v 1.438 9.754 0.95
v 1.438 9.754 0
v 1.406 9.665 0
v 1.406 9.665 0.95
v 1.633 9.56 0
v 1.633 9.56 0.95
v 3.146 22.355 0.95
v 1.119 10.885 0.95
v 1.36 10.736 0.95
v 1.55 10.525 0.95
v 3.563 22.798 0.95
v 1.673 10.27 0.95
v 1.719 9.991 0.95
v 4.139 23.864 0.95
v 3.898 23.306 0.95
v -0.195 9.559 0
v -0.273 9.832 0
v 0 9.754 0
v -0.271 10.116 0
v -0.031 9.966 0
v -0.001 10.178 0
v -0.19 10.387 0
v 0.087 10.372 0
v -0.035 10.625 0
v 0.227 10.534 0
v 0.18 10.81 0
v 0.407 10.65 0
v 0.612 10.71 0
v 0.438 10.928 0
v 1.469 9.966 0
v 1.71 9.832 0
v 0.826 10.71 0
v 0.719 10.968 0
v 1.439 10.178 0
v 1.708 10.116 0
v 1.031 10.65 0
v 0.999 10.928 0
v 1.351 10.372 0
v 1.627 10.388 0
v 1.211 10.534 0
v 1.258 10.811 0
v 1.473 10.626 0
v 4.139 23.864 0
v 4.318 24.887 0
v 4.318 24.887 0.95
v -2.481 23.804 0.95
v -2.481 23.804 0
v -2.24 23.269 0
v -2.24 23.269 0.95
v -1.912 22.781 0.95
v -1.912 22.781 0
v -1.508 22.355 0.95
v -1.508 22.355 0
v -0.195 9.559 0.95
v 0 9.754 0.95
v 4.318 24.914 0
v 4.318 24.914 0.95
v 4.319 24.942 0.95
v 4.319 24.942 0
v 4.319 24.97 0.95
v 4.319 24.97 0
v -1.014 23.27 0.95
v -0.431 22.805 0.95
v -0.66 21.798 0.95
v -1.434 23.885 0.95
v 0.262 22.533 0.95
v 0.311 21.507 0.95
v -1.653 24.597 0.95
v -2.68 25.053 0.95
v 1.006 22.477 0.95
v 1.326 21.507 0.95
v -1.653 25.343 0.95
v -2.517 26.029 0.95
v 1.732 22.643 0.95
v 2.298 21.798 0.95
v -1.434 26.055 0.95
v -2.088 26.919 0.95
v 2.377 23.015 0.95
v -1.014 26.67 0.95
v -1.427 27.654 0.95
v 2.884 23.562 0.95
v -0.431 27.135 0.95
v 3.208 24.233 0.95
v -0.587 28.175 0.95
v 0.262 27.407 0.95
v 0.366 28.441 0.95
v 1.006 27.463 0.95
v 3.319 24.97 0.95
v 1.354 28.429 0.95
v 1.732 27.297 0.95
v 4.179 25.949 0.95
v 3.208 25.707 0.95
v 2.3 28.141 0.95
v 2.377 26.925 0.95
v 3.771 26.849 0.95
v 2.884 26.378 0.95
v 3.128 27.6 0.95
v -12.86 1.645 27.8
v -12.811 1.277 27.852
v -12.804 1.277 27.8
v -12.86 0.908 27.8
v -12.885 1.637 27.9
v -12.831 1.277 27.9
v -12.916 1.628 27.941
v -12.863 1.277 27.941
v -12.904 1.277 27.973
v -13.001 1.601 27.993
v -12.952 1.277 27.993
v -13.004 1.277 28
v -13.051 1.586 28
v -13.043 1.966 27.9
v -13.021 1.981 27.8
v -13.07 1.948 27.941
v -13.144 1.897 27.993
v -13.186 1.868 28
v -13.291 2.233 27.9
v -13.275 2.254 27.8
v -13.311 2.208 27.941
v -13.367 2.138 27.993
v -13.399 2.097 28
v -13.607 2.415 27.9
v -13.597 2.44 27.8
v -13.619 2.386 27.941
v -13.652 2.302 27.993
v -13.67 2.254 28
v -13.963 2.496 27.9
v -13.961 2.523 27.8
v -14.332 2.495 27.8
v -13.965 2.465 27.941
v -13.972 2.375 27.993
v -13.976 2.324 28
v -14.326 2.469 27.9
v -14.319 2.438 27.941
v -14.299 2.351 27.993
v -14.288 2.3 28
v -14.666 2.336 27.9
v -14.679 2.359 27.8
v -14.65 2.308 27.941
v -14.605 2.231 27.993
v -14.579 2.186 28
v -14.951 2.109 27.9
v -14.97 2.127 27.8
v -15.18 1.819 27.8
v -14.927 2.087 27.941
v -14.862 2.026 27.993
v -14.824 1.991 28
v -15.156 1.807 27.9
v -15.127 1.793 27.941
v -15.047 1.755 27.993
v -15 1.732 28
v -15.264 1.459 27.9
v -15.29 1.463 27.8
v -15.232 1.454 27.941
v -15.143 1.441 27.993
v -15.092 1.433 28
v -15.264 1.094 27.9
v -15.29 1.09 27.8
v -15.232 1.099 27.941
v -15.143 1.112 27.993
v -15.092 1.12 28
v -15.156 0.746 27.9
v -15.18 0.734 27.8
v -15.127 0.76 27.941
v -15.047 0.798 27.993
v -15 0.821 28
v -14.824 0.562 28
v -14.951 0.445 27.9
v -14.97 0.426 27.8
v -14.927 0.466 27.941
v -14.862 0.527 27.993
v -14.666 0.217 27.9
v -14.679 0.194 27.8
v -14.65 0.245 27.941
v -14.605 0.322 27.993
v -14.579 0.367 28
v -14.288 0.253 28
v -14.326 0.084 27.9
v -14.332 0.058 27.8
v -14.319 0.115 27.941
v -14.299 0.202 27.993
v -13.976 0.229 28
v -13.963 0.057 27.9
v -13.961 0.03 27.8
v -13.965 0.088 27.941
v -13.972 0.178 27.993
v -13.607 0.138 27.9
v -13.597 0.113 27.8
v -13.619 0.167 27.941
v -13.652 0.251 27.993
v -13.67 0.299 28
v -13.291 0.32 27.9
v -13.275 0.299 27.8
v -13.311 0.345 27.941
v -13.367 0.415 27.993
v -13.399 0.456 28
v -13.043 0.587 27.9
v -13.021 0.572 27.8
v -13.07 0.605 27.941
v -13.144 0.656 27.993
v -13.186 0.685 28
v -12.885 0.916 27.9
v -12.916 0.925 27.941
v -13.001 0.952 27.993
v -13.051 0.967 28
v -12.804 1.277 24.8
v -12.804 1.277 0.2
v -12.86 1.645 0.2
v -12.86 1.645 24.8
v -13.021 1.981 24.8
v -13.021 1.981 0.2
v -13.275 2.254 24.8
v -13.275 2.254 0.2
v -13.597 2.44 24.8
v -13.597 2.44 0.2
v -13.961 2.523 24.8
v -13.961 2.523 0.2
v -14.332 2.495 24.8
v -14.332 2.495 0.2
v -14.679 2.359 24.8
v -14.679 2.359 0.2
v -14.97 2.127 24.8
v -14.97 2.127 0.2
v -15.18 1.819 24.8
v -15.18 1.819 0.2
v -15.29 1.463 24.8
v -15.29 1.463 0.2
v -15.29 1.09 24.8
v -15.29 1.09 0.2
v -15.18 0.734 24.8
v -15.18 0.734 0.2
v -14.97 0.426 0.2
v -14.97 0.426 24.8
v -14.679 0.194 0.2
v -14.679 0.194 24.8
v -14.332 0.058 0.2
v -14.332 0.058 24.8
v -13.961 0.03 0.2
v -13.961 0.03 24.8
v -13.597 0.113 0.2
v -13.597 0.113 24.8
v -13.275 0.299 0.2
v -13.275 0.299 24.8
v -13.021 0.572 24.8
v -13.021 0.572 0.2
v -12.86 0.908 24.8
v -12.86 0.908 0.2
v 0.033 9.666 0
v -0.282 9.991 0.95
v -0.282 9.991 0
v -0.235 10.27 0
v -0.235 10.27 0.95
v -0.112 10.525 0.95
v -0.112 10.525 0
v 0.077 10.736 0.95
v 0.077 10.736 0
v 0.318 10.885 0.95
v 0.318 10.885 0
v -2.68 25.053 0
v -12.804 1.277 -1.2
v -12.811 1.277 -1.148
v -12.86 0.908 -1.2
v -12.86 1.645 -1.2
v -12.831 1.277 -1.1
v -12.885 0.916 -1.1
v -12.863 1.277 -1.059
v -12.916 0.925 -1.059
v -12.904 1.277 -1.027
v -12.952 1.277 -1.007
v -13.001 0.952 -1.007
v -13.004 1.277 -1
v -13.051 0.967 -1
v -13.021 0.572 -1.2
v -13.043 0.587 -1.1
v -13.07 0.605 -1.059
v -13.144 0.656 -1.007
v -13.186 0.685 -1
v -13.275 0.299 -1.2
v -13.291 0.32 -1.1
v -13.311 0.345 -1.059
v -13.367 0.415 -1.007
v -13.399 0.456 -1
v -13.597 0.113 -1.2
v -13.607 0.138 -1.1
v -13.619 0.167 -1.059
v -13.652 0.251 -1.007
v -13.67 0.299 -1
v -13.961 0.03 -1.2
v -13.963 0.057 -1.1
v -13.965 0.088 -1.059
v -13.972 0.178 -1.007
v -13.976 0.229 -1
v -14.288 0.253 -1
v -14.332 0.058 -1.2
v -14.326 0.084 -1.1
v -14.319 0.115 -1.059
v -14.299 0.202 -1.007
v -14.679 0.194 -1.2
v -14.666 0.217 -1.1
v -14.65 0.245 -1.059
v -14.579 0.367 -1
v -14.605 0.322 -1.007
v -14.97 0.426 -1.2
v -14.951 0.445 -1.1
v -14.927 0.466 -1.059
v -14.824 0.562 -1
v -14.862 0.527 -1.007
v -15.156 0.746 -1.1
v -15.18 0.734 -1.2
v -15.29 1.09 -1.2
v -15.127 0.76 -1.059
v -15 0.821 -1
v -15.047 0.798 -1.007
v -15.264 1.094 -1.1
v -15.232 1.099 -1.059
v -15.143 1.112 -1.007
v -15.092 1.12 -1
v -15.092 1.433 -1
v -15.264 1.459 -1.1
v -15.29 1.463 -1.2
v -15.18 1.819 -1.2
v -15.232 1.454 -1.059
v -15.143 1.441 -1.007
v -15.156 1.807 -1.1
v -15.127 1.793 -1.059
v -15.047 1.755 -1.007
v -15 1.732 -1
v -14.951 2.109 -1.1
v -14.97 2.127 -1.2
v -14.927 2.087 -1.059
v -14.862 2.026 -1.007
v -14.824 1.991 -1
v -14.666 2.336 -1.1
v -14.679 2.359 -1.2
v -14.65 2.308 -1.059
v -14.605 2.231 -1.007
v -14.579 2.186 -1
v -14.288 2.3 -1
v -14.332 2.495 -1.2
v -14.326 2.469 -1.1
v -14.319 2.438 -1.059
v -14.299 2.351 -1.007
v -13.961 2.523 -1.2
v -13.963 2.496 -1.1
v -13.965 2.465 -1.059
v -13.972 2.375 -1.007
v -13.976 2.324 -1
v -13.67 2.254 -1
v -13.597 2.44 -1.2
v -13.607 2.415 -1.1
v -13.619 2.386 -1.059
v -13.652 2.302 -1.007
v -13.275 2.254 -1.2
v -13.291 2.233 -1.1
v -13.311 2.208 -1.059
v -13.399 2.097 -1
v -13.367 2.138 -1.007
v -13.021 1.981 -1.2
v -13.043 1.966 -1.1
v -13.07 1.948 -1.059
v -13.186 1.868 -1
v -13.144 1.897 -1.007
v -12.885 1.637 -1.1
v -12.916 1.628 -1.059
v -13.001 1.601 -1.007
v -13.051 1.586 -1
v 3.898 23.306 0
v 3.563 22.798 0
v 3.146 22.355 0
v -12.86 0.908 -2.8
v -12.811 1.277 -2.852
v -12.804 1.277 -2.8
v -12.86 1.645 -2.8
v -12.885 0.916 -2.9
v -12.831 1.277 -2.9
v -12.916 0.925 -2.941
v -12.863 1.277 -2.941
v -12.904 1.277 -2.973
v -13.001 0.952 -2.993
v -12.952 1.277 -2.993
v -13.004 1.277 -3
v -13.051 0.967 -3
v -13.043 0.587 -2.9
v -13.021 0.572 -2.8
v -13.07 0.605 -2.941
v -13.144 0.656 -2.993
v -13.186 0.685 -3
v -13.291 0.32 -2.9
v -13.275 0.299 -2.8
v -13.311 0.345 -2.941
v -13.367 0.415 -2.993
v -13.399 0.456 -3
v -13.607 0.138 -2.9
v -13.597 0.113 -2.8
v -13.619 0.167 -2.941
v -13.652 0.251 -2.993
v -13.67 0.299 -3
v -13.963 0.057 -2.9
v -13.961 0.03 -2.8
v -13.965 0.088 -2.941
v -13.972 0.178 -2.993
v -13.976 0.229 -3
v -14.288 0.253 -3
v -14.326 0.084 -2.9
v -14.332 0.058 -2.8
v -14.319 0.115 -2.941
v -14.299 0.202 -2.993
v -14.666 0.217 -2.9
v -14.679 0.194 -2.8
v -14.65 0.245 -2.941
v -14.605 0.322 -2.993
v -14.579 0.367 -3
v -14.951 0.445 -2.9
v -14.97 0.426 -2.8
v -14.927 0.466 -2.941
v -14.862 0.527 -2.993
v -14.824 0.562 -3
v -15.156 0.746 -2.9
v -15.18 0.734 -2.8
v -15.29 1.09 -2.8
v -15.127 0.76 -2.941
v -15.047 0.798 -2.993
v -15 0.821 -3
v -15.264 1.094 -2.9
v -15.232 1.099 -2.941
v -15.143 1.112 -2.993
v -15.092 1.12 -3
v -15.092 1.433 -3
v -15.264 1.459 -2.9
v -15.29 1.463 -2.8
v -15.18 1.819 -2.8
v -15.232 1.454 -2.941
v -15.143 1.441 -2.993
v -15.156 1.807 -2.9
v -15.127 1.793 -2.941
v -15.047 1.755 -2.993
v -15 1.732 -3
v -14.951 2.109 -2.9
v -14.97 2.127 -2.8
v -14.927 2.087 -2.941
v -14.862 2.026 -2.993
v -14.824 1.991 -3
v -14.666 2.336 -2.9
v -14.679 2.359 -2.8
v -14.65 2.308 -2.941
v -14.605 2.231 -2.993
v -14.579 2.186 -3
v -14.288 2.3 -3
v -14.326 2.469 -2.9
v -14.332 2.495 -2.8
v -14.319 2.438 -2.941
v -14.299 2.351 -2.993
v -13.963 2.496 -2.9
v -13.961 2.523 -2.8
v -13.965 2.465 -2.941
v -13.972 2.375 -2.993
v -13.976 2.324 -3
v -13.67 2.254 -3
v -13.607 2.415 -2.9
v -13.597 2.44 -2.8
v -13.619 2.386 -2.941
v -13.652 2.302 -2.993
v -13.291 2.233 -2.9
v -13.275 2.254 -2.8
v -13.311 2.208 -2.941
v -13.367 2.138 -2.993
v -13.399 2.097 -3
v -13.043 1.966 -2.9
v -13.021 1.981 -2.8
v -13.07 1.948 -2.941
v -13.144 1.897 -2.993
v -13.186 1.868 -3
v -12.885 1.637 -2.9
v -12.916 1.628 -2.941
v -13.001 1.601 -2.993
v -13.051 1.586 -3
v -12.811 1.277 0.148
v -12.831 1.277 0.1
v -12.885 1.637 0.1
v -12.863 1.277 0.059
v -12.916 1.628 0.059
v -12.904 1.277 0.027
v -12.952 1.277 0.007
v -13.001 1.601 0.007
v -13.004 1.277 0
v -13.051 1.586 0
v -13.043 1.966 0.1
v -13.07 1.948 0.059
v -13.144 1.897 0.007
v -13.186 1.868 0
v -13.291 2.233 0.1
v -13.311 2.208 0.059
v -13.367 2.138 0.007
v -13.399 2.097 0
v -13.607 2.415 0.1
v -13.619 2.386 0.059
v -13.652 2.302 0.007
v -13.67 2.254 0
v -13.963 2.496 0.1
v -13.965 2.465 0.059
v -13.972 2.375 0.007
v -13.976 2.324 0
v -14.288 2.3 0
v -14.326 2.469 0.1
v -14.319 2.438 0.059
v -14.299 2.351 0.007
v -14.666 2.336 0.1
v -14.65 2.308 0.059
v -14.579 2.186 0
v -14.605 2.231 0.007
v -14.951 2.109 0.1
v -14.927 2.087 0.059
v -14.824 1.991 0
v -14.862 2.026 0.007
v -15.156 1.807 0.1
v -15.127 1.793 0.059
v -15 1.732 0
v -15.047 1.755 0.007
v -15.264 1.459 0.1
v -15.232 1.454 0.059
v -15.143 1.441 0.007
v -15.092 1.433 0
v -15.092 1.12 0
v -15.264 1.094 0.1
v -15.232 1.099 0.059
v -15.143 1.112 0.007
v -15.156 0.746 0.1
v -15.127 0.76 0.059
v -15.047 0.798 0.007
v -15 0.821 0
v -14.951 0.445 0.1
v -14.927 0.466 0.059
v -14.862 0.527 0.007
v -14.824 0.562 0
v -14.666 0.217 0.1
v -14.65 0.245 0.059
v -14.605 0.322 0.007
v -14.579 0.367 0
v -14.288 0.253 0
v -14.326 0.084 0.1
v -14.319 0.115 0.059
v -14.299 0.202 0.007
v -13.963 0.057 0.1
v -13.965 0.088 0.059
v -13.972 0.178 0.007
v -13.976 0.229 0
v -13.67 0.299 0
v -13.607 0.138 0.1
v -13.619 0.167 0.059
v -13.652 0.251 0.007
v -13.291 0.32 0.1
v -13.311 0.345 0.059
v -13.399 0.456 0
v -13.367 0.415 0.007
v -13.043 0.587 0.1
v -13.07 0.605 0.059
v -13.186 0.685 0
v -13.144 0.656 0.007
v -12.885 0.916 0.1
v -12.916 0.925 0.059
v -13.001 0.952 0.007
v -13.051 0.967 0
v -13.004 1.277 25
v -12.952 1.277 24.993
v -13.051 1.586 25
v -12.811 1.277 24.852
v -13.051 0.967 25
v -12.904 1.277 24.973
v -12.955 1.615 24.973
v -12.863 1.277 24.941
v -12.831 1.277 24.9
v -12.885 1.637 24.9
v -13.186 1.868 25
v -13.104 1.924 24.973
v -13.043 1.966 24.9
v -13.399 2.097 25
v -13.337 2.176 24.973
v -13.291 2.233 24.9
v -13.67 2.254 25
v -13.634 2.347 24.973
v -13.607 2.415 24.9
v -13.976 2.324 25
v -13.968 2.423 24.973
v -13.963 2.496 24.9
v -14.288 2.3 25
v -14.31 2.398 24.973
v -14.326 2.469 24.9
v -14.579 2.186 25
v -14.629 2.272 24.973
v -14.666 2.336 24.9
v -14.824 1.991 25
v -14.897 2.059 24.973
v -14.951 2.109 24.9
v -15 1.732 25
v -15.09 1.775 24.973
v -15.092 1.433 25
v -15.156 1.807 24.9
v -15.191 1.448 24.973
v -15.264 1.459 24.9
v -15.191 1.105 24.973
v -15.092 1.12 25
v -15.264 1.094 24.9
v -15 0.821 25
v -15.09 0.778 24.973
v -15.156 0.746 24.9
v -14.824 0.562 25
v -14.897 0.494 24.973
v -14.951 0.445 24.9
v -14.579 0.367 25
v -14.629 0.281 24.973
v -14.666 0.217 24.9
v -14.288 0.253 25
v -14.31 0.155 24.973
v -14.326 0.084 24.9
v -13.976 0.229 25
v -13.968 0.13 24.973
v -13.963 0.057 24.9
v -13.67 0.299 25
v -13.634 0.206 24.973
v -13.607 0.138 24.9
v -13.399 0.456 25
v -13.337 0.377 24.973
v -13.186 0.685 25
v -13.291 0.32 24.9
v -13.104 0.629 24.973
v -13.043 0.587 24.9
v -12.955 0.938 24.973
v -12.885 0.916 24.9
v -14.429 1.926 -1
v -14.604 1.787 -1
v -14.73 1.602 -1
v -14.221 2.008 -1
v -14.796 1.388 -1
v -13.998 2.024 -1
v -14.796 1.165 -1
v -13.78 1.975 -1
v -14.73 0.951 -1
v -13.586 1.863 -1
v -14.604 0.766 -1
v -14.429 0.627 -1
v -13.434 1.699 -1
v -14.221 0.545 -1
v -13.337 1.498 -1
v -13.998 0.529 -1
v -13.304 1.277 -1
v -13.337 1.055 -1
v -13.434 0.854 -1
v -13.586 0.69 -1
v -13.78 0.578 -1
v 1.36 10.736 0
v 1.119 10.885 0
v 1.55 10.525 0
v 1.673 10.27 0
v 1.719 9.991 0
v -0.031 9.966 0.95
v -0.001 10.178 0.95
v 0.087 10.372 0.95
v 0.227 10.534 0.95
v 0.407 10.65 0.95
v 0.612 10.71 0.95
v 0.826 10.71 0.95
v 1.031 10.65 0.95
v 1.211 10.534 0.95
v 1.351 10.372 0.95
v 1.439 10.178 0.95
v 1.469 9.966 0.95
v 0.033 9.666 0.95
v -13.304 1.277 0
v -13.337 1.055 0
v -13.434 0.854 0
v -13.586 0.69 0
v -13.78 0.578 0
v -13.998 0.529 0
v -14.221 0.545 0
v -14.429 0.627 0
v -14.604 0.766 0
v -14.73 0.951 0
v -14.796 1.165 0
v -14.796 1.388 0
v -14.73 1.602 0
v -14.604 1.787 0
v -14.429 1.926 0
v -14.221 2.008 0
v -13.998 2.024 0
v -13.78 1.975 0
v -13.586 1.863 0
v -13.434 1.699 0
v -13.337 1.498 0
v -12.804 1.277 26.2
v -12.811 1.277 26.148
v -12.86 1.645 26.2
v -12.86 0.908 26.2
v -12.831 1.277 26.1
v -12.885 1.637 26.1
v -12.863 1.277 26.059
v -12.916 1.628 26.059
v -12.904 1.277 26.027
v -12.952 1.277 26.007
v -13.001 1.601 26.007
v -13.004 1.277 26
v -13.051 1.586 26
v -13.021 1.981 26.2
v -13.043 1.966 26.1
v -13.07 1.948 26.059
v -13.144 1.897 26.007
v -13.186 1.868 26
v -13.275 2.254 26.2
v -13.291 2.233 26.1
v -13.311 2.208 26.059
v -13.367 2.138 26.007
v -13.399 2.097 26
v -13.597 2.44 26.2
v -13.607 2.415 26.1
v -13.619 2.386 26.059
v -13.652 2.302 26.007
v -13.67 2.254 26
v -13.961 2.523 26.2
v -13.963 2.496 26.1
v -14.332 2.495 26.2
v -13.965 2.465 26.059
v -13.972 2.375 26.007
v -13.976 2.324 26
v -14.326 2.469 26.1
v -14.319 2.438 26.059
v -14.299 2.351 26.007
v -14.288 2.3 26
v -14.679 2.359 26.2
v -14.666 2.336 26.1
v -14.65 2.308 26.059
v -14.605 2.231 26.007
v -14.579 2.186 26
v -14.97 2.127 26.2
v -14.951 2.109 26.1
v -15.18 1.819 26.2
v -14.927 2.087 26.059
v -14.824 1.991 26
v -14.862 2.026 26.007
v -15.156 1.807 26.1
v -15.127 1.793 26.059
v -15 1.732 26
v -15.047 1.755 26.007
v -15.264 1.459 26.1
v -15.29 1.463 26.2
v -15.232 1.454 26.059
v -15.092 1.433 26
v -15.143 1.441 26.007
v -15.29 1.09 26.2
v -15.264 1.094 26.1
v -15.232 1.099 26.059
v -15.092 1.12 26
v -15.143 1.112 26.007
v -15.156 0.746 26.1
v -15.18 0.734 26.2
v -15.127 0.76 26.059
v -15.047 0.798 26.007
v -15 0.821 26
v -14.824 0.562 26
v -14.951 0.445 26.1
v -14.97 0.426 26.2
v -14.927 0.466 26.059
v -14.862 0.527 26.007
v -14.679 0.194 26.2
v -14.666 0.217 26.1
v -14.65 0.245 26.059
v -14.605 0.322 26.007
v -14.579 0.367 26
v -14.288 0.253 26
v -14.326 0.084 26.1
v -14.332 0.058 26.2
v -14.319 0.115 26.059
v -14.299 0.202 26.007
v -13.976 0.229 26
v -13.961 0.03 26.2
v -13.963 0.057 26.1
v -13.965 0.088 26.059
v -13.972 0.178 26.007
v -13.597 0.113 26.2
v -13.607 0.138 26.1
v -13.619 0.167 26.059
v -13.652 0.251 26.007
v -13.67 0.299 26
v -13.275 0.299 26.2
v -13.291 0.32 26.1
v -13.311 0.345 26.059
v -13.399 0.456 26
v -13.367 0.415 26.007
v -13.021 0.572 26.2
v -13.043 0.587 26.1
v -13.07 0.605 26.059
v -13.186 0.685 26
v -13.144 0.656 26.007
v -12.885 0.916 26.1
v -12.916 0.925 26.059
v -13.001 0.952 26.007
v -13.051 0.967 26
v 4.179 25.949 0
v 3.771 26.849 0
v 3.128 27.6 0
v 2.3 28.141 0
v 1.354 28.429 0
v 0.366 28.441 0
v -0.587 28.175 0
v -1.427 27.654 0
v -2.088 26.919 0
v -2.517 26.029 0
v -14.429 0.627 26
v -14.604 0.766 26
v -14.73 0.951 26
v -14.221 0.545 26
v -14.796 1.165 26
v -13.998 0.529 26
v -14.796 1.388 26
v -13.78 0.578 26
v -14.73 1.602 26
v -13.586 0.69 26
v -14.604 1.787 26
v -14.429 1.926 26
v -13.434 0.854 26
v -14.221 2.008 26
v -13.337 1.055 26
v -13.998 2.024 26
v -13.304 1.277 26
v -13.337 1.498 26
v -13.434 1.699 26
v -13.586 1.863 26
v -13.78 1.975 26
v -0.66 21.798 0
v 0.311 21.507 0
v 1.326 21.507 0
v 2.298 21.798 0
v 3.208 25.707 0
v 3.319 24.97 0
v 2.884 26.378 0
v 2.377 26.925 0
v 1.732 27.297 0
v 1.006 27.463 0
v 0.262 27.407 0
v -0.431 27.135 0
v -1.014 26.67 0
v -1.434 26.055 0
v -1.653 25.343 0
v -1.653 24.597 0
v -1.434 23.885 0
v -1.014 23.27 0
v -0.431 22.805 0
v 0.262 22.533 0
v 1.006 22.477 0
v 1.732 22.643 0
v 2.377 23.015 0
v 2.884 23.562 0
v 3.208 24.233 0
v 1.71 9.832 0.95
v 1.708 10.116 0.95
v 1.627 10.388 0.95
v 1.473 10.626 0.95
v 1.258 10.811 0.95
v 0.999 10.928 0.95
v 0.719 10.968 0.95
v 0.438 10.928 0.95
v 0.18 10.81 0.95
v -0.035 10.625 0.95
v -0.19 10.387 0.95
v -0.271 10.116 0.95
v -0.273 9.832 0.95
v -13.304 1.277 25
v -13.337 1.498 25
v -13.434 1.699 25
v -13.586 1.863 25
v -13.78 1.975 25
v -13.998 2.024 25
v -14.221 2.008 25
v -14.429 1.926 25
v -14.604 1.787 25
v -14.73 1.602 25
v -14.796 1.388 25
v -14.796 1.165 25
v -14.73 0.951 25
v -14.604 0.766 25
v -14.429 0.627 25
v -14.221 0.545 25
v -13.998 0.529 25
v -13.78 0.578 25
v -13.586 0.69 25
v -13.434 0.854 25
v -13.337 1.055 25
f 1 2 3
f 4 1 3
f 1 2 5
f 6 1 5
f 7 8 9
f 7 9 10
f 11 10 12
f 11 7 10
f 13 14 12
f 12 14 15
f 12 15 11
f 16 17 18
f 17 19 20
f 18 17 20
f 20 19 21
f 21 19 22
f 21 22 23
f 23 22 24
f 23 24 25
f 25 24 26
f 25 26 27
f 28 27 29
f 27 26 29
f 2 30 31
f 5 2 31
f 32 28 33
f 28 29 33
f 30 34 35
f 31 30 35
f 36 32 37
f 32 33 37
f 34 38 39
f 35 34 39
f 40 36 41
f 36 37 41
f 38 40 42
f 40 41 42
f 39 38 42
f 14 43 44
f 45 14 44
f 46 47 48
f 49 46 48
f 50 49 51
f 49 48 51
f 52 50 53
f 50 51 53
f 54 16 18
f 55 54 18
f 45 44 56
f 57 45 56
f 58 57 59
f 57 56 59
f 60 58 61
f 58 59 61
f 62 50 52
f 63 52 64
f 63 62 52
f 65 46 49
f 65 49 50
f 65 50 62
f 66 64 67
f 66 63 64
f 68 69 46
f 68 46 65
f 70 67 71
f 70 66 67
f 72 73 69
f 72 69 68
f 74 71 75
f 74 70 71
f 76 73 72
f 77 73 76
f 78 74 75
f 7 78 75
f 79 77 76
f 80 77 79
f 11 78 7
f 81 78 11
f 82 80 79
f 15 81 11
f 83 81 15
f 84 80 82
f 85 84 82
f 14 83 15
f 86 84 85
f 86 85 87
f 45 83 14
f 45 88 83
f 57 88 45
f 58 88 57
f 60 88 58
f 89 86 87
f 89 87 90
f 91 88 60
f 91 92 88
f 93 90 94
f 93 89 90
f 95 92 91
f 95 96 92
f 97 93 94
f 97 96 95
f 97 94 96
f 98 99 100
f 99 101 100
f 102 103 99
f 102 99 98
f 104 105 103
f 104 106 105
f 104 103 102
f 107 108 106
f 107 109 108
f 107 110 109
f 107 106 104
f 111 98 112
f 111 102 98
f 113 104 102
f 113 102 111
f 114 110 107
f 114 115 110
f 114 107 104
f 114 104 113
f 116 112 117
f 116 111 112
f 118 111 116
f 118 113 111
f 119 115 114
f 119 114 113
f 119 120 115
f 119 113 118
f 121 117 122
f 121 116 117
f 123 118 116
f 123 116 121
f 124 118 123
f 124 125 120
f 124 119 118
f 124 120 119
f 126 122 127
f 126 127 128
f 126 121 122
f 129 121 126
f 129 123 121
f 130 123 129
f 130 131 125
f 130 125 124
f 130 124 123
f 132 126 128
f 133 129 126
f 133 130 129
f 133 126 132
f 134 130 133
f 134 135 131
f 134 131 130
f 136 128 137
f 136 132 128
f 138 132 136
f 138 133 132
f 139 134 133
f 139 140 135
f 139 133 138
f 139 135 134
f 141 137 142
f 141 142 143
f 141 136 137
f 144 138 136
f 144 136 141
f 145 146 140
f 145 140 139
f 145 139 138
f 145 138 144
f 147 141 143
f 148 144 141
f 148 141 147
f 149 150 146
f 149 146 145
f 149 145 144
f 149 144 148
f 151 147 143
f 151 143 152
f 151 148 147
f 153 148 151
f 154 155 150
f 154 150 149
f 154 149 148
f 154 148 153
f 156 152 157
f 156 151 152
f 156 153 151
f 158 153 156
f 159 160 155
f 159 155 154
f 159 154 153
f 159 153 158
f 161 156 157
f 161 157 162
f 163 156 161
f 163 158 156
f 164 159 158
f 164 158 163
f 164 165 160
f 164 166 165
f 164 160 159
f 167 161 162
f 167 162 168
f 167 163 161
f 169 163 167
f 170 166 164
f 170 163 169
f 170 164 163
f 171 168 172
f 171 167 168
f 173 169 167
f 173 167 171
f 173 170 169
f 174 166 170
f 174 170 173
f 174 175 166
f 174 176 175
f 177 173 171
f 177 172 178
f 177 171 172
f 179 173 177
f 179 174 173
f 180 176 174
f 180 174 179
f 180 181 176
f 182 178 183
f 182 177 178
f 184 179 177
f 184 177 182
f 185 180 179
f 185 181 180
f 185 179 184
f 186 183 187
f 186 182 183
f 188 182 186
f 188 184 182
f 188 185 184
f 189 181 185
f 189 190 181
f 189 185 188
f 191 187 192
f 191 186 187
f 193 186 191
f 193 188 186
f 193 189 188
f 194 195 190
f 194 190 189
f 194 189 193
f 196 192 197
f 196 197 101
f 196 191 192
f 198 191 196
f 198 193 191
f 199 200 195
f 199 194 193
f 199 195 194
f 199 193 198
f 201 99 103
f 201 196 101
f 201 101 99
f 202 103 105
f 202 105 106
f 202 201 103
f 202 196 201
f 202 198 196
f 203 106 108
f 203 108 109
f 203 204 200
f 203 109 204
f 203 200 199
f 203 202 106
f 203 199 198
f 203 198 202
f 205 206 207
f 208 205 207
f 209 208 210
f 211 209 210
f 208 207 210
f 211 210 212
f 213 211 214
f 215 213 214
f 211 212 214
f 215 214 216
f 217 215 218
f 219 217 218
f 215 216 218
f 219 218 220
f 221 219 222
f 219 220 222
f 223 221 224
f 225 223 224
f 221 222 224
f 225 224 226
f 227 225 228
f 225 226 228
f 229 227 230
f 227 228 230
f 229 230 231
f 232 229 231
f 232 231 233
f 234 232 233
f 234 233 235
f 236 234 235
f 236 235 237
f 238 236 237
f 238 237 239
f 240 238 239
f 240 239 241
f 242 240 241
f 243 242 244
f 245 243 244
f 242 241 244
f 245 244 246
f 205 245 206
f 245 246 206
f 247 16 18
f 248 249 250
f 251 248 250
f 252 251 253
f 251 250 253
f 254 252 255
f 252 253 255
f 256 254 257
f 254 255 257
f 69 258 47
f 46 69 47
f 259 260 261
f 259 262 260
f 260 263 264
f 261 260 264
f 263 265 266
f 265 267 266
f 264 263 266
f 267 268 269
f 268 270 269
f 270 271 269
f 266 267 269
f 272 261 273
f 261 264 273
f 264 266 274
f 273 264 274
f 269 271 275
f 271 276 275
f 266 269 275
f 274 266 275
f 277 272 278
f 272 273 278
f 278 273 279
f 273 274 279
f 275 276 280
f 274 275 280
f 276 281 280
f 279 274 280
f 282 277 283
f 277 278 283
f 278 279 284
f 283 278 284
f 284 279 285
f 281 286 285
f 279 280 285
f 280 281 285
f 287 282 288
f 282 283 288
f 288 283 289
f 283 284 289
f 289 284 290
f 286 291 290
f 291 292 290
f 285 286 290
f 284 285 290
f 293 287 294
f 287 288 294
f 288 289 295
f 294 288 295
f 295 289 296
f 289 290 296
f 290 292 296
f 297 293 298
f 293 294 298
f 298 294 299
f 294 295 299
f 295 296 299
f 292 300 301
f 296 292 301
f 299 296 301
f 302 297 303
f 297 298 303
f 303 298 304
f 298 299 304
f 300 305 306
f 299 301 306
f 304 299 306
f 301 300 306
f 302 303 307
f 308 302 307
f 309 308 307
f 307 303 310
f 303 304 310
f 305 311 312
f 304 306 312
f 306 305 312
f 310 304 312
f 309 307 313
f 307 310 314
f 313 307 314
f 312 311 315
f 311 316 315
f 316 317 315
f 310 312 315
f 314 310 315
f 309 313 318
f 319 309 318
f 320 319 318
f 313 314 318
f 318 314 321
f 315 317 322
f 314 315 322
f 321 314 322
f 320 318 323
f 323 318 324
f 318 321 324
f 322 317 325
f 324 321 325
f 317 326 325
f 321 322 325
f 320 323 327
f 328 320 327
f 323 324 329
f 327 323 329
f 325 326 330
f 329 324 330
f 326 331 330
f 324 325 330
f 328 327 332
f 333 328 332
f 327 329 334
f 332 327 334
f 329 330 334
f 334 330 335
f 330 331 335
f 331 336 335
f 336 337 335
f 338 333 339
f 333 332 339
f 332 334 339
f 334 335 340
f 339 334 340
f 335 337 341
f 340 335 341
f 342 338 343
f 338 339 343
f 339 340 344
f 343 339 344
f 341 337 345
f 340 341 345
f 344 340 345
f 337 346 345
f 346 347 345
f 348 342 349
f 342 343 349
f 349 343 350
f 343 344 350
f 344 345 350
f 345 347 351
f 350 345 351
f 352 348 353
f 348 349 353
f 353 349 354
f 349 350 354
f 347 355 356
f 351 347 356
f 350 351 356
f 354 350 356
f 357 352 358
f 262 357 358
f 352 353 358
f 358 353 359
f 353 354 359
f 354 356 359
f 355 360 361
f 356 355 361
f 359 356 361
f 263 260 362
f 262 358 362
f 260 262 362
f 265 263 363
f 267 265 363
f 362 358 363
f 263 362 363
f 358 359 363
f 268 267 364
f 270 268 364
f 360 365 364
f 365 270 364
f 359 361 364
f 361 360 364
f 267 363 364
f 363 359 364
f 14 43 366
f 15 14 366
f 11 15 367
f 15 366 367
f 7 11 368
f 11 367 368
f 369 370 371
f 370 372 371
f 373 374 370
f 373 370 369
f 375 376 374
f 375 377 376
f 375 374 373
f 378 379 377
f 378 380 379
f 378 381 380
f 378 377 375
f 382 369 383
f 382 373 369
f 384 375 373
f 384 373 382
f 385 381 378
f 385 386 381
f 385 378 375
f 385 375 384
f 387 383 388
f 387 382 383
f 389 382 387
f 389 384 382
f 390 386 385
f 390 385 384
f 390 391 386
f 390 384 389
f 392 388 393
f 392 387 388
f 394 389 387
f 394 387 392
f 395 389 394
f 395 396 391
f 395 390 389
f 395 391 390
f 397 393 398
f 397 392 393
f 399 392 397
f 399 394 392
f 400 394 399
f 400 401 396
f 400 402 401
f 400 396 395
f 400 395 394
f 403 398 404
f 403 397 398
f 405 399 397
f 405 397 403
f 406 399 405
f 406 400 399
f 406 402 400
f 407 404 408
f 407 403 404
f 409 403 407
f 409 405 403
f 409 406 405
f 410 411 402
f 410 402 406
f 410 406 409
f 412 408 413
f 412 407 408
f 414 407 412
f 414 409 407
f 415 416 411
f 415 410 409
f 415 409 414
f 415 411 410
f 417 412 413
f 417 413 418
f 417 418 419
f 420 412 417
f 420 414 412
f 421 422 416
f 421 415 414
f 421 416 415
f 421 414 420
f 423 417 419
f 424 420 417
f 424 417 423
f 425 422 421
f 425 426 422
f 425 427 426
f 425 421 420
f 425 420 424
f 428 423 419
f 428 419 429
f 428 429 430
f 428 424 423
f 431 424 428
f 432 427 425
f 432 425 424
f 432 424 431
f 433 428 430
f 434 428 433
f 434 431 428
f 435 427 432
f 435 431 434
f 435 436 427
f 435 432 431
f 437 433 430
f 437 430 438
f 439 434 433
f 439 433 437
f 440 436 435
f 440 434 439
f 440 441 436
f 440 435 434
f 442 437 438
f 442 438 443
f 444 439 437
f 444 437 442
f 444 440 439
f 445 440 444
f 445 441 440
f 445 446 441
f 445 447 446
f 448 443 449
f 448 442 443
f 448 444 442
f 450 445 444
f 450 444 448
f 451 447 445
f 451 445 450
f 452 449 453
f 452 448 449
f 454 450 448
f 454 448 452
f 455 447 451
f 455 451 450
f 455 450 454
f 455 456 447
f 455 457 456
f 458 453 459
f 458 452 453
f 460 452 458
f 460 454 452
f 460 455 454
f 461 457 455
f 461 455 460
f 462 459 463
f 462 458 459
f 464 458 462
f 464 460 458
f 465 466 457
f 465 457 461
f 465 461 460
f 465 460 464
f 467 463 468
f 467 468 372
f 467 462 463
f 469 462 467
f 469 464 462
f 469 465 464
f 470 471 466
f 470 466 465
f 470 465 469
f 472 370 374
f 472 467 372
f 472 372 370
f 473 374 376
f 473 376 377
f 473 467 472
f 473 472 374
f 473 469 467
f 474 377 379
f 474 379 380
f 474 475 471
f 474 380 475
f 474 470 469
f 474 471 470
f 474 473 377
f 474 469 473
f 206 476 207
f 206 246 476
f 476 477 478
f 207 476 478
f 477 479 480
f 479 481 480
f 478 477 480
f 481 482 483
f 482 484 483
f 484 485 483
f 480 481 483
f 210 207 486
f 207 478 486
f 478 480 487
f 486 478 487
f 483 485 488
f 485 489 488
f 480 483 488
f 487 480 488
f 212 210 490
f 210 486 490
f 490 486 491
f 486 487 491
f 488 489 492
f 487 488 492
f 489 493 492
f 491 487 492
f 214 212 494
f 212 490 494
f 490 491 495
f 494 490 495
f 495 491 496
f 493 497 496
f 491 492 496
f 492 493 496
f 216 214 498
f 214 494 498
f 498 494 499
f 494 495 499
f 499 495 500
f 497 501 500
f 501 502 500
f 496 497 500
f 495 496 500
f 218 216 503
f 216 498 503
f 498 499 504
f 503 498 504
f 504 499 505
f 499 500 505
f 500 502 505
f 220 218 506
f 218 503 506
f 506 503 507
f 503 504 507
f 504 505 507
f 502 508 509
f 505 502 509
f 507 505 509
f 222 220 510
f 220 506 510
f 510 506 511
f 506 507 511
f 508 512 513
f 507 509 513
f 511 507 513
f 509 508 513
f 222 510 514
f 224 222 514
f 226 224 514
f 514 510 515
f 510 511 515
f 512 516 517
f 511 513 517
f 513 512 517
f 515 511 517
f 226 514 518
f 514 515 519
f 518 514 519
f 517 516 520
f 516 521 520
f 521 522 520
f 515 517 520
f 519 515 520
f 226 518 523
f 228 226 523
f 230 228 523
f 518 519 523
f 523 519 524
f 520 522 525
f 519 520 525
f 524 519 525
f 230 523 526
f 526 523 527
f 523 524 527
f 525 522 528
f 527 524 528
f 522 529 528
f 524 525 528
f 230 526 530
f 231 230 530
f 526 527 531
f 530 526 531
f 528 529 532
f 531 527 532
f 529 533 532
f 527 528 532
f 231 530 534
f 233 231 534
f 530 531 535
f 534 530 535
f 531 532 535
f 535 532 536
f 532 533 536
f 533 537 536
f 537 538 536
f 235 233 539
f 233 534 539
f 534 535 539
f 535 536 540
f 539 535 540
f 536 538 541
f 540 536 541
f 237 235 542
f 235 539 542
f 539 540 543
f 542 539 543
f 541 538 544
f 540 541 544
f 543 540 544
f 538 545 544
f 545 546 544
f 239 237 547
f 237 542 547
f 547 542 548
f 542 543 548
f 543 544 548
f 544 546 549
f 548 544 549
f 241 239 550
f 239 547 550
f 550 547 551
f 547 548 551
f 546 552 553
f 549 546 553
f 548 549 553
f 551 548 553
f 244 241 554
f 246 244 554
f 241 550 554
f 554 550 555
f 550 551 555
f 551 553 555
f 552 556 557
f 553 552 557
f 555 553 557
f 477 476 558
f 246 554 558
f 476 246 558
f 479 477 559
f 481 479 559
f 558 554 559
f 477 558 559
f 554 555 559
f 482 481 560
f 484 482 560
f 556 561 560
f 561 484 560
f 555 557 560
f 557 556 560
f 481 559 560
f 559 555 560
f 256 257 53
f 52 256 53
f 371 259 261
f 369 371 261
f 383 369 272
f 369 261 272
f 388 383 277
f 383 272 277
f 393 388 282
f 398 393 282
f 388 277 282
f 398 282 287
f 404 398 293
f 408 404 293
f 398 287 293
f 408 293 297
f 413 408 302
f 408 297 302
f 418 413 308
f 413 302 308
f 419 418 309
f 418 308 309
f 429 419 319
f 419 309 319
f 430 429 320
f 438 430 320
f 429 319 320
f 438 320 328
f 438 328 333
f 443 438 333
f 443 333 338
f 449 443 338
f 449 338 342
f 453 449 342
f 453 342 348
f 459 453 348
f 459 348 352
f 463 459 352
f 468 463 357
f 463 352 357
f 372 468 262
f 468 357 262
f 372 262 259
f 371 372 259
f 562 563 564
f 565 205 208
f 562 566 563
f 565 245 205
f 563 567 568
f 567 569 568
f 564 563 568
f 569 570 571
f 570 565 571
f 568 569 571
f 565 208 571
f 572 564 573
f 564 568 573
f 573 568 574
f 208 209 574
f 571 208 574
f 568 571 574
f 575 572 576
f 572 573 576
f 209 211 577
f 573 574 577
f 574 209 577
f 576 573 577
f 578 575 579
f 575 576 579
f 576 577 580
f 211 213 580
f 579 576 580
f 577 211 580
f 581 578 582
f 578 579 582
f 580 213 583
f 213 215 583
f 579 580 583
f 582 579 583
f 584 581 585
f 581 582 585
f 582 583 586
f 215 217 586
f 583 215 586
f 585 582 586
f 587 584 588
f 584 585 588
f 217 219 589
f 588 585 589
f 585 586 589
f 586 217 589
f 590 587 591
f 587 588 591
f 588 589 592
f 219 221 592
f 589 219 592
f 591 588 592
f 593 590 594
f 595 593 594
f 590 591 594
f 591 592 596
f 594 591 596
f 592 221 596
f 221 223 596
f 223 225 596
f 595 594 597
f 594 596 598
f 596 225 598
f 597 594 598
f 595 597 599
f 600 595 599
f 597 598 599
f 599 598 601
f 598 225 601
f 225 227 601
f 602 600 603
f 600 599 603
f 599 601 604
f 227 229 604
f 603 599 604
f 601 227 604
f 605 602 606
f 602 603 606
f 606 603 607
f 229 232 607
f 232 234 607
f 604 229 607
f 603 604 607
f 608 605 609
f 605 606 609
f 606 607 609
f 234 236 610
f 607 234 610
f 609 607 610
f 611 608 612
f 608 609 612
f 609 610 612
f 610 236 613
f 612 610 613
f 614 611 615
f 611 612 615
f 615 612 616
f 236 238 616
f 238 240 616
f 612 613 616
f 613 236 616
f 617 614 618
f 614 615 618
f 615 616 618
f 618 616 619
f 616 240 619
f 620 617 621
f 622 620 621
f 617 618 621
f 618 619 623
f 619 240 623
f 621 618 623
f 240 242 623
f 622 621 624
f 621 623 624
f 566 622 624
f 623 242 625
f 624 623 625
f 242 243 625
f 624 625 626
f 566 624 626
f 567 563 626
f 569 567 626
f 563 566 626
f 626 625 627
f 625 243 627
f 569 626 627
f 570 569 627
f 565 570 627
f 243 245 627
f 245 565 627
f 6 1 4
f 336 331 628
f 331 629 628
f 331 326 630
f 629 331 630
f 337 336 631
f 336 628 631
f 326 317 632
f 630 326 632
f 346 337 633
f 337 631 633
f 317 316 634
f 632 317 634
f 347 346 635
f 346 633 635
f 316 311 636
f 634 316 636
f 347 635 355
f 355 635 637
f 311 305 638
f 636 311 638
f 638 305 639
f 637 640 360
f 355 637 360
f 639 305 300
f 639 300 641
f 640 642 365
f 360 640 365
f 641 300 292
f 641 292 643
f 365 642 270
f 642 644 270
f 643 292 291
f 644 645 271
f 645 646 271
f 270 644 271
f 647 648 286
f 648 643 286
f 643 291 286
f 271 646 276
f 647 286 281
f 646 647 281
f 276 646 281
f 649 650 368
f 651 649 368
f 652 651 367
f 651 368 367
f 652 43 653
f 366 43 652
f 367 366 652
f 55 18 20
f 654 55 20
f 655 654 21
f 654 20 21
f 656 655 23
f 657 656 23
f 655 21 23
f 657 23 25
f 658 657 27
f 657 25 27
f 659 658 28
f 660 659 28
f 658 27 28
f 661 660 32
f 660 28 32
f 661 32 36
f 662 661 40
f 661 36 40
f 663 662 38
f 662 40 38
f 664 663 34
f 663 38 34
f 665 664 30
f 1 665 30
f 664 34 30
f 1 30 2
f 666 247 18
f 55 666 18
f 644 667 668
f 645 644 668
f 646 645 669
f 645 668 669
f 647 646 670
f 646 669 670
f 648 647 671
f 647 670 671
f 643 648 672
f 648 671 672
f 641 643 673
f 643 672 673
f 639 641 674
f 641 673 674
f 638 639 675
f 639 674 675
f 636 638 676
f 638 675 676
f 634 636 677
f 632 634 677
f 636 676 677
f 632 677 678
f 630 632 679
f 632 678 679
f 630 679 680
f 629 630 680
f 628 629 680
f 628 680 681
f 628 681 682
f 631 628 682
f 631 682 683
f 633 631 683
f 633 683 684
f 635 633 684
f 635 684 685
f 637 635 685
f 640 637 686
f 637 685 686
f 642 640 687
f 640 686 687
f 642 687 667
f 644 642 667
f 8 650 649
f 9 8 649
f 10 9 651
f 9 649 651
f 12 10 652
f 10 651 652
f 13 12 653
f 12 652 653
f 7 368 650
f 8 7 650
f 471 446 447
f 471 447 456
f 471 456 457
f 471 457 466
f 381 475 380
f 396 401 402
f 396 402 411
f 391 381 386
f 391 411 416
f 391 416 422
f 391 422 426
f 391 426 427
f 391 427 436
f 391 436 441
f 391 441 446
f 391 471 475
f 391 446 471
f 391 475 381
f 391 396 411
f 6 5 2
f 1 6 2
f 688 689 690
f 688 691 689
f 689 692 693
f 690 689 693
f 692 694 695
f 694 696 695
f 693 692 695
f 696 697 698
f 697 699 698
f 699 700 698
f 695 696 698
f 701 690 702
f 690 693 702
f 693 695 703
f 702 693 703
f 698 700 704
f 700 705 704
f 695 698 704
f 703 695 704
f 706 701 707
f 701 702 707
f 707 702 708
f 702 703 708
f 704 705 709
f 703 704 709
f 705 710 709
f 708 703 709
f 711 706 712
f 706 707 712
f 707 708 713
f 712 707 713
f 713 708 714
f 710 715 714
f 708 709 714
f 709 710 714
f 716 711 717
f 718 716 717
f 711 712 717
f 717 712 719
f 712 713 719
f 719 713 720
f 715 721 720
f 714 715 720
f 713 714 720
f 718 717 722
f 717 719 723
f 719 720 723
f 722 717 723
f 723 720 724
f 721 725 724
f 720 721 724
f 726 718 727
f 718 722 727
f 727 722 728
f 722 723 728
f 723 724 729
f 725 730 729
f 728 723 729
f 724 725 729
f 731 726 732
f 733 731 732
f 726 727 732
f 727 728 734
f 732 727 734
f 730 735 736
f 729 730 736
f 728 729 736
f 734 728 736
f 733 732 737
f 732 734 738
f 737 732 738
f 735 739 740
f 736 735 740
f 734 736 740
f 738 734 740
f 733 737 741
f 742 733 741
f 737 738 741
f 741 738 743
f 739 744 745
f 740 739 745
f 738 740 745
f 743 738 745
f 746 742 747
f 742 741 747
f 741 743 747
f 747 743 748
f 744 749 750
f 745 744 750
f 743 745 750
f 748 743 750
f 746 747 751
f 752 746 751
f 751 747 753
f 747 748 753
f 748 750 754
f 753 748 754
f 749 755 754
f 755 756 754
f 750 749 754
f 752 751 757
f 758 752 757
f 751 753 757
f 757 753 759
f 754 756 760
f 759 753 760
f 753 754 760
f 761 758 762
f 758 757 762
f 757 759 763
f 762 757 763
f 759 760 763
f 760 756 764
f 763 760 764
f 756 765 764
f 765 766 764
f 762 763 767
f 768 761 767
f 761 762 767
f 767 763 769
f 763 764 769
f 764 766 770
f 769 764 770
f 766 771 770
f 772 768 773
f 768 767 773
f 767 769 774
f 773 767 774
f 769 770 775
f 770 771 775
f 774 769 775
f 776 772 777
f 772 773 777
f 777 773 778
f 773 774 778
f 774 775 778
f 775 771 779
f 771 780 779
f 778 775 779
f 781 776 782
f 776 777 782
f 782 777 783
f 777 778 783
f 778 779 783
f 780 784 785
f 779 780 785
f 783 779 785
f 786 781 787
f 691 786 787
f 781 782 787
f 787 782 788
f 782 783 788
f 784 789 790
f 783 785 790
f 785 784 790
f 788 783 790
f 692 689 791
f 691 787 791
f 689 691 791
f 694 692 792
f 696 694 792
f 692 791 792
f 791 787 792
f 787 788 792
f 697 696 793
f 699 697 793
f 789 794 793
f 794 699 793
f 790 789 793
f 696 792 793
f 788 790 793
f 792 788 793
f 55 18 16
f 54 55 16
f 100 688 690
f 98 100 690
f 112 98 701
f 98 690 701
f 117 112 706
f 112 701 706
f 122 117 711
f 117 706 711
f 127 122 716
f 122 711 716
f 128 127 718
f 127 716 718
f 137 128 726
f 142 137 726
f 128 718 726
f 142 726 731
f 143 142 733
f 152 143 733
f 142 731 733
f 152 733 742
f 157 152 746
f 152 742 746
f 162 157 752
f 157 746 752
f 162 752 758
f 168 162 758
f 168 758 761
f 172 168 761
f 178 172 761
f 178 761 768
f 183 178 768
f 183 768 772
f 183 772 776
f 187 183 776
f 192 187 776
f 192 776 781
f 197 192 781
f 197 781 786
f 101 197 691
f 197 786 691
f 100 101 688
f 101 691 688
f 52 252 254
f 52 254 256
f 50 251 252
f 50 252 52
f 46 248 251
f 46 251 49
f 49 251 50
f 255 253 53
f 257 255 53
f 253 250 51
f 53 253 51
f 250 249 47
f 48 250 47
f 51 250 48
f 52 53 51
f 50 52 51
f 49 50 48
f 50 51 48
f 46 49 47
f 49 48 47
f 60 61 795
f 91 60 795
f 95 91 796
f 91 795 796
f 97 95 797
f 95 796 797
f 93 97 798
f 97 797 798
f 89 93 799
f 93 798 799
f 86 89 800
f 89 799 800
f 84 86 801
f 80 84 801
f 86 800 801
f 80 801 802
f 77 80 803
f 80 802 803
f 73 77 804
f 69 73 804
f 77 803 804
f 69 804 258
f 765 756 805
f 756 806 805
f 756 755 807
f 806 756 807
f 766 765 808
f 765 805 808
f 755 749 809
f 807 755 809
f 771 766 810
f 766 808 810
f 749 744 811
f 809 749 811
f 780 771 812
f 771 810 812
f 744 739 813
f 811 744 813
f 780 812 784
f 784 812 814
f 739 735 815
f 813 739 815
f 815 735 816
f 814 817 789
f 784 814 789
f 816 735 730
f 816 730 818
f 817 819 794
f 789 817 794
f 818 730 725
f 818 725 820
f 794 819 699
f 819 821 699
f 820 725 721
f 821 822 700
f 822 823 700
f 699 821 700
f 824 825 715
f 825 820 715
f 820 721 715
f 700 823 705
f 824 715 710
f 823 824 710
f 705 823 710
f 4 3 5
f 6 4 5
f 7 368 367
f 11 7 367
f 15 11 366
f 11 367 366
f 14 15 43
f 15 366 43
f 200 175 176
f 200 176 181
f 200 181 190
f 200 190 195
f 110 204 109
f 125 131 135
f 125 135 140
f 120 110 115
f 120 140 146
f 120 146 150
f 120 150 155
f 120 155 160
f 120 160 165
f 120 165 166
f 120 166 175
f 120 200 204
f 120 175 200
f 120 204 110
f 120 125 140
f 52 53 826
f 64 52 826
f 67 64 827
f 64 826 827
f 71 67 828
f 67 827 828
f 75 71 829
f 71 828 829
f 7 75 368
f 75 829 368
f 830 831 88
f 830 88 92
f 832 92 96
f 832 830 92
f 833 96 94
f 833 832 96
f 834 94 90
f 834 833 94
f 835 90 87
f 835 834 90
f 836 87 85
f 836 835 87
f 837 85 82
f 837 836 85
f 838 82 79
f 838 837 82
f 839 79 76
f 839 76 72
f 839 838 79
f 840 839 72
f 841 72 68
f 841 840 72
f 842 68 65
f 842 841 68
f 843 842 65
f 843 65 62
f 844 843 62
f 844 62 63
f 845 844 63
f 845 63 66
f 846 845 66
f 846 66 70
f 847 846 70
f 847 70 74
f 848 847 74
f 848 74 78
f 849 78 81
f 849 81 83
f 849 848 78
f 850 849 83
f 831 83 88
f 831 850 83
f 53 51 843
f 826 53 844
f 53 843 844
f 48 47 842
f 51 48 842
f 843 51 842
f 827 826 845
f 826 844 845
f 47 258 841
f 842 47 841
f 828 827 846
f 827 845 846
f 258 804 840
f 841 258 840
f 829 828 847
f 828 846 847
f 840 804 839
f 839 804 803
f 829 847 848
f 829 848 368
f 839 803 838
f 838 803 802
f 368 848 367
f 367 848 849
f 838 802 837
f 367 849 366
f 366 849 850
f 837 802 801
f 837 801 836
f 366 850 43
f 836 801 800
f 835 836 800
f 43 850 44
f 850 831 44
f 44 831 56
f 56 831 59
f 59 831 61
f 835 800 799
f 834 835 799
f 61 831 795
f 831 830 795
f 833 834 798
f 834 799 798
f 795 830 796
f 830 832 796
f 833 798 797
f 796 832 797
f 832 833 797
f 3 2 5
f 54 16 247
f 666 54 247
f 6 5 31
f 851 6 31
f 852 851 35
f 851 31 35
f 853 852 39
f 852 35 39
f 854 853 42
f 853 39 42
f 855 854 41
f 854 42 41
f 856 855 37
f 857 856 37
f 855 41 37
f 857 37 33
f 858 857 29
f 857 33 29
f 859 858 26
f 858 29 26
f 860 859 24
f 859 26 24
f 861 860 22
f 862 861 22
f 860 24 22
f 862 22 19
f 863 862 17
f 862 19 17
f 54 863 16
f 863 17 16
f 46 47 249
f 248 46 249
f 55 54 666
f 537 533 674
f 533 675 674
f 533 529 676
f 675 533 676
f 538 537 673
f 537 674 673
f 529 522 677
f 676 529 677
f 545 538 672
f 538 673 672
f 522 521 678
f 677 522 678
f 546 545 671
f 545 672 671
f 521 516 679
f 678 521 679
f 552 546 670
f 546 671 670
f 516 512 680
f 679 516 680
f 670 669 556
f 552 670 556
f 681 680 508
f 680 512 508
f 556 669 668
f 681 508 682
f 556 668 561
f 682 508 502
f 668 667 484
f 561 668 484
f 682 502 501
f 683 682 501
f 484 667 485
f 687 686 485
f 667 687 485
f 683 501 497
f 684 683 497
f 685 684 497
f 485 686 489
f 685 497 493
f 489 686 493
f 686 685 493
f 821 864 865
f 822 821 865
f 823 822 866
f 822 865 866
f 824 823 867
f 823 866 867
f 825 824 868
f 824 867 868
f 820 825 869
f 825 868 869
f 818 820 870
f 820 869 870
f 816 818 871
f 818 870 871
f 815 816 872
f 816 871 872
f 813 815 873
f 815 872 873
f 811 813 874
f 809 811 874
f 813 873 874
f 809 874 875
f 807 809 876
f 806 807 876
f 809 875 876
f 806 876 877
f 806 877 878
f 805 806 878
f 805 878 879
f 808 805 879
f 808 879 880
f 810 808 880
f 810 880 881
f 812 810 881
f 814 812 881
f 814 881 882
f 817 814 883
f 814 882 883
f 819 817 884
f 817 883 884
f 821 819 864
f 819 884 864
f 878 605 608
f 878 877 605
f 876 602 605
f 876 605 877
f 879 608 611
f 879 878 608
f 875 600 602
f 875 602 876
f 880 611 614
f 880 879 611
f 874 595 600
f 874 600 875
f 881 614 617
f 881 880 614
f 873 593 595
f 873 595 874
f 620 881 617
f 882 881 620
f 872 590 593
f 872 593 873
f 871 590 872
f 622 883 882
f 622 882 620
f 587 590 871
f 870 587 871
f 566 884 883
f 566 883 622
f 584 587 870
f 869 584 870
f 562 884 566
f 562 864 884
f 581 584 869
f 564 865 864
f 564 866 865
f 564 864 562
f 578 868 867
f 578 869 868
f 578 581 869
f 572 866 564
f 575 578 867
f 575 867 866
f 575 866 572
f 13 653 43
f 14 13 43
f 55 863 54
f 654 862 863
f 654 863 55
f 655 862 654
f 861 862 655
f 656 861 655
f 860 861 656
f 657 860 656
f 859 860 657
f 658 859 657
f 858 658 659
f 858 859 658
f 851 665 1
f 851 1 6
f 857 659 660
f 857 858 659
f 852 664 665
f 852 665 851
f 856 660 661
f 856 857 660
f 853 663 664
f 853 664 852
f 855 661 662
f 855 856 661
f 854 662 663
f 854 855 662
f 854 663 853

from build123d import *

# Parameters (mm, degrees)
F0_R      = 1.25
F1_DEPTH  = 25
F2_R      = 0.75
F3_DEPTH  = 1
F4_R      = 1.25
F5_DEPTH  = 2
F6_R      = 0.2
F7_R      = 0.75
F8_DEPTH  = 1
F9_R      = 1.25
F10_DEPTH = 2
F11_R     = 0.2
F14_DEPTH = 0.95
F13_R     = 2.5
F15_DEPTH = 0.95


# Not quite as in the source:
# - a feature names something its author has since deleted; it is built from what else it names


with BuildPart() as f1:
    # F0 (on Top) → F1 (new body)
    with BuildSketch(Plane.XY):
        with Locations((-14.0540208668, 1.2765177526)):
            Circle(F0_R)
    extrude(amount=F1_DEPTH)

    # F2 (on face) → F3 (join)
    with BuildSketch(Plane.XY.offset(25)):
        with Locations((-14.0540208668, 1.2765177526)):
            Circle(F2_R)
    extrude(amount=F3_DEPTH)

    # F4 (on face) → F5 (join)
    with BuildSketch(Plane.XY.offset(26)):
        with Locations((-14.0540208668, 1.2765177526)):
            Circle(F4_R)
    extrude(amount=F5_DEPTH)

    # F6
    f6_edges = [f1.edges().sort_by_distance(p)[0] for p in [
        (-15.304021, 1.276518, 25),
        (-15.304021, 1.276518, 26),
        (-15.304021, 1.276518, 28),
        (-15.304021, 1.276518, 0),
    ]]
    fillet(f6_edges, radius=F6_R)

    # F7 (on face) → F8 (join)
    with BuildSketch(Plane(origin=(0, 0, 0), x_dir=(1, 0, 0), z_dir=(0, 0, -1))):
        with Locations((-14.0540208668, -1.2765177526)):
            Circle(F7_R)
    extrude(amount=F8_DEPTH)

    # F9 (on face) → F10 (join)
    with BuildSketch(Plane(origin=(0, 0, -1), x_dir=(1, 0, 0), z_dir=(0, 0, -1))):
        with Locations((-14.0540208668, -1.2765177526)):
            Circle(F9_R)
    extrude(amount=F10_DEPTH)

    # F11
    f11_edges = [f1.edges().sort_by_distance(p)[0] for p in [
        (-15.304021, 1.276518, -3),
        (-15.304021, 1.276518, -1),
    ]]
    fillet(f11_edges, radius=F11_R)


with BuildPart() as f14:
    # F12 (on Top) → F14 (new body)
    with BuildSketch(Plane.XY):
        with BuildLine():
            ThreePointArc((0, 9.754398472), (0.718912718, 10.7180910171), (1.4378254361, 9.754398472))
            Line((1.4378254361, 9.754398472), (1.6326663215, 9.5595575866))
            ThreePointArc((1.6326663215, 9.5595575866), (0.7185053455, 10.9681246644), (-0.1951614716, 9.5592370004))
            Line((-0.1951614716, 9.5592370004), (0, 9.754398472))
        make_face()
    extrude(amount=F14_DEPTH)


with BuildPart() as f14b:
    # F13 (on face) → F14, piece 2 (new body)
    with BuildSketch(Plane.XY):
        with BuildLine():
            ThreePointArc((4.3177234546, 24.8866700044), (4.3184676742, 24.9283358265), (4.3187157592, 24.9700075561))
            ThreePointArc((4.3187157592, 24.9700075561), (0.8603874888, 28.4697594712), (-2.6802919362, 25.0533451079))
            Line((-2.6802919362, 25.0533451079), (-2.4813634191, 23.8040412543))
            ThreePointArc((-2.4813634191, 23.8040412543), (-2.0864758559, 23.0181208586), (-1.5081208042, 22.3554652239))
            ThreePointArc((-1.5081208042, 22.3554652239), (0.8187157592, 21.4700075561), (3.1455523226, 22.3554652239))
            ThreePointArc((3.1455523226, 22.3554652239), (3.7413801422, 23.044382228), (4.1392738139, 23.863710035))
            Line((4.1392738139, 23.863710035), (4.3177234546, 24.8866700044))
        make_face()
        with Locations((0.8187157592, 24.9700075561)):
            Circle(F13_R, mode=Mode.SUBTRACT)
    extrude(amount=F14_DEPTH)


with BuildPart() as f14c:
    # F13 (on face) → F14, piece 3 (new body)
    with BuildSketch(Plane.XY):
        Polygon((0, 9.754398472), (-0.1951614716, 9.5592370004), (0.0334535479, 9.6658419348), align=None)
    extrude(amount=F14_DEPTH)


with BuildPart() as f14d:
    # F13 (on face) → F14, piece 4 (new body)
    with BuildSketch(Plane.XY):
        Polygon((1.4058124998, 9.6653412609), (1.6326663215, 9.5595575866), (1.4378254361, 9.754398472), align=None)
    extrude(amount=F14_DEPTH)


with BuildPart() as f15:
    # F13 (on face) → F15 (new body)
    with BuildSketch(Plane.XY):
        with BuildLine():
            ThreePointArc((-1.5081208042, 22.3554652239), (-2.0864758559, 23.0181208586), (-2.4813634191, 23.8040412543))
            Line((-2.4813634191, 23.8040412543), (-0.281858813, 9.9907900398))
            ThreePointArc((-0.281858813, 9.9907900398), (-0.1121579443, 10.5252860826), (0.3184033106, 10.8845929296))
            Line((0.3184033106, 10.8845929296), (-1.5081208042, 22.3554652239))
        make_face()
    extrude(amount=F15_DEPTH)


with BuildPart() as f15b:
    # F13 (on face) → F15, piece 2 (new body)
    with BuildSketch(Plane.XY):
        with BuildLine():
            Line((1.7192205738, 9.9907900398), (4.1392738139, 23.863710035))
            ThreePointArc((4.1392738139, 23.863710035), (3.7413801422, 23.044382228), (3.1455523226, 22.3554652239))
            Line((3.1455523226, 22.3554652239), (1.1189584502, 10.8845929296))
            ThreePointArc((1.1189584502, 10.8845929296), (1.5495197052, 10.5252860826), (1.7192205738, 9.9907900398))
        make_face()
    extrude(amount=F15_DEPTH)


solid = Compound([f1.part, f14.part, f14b.part, f14c.part, f14d.part, f15.part, f15b.part])
